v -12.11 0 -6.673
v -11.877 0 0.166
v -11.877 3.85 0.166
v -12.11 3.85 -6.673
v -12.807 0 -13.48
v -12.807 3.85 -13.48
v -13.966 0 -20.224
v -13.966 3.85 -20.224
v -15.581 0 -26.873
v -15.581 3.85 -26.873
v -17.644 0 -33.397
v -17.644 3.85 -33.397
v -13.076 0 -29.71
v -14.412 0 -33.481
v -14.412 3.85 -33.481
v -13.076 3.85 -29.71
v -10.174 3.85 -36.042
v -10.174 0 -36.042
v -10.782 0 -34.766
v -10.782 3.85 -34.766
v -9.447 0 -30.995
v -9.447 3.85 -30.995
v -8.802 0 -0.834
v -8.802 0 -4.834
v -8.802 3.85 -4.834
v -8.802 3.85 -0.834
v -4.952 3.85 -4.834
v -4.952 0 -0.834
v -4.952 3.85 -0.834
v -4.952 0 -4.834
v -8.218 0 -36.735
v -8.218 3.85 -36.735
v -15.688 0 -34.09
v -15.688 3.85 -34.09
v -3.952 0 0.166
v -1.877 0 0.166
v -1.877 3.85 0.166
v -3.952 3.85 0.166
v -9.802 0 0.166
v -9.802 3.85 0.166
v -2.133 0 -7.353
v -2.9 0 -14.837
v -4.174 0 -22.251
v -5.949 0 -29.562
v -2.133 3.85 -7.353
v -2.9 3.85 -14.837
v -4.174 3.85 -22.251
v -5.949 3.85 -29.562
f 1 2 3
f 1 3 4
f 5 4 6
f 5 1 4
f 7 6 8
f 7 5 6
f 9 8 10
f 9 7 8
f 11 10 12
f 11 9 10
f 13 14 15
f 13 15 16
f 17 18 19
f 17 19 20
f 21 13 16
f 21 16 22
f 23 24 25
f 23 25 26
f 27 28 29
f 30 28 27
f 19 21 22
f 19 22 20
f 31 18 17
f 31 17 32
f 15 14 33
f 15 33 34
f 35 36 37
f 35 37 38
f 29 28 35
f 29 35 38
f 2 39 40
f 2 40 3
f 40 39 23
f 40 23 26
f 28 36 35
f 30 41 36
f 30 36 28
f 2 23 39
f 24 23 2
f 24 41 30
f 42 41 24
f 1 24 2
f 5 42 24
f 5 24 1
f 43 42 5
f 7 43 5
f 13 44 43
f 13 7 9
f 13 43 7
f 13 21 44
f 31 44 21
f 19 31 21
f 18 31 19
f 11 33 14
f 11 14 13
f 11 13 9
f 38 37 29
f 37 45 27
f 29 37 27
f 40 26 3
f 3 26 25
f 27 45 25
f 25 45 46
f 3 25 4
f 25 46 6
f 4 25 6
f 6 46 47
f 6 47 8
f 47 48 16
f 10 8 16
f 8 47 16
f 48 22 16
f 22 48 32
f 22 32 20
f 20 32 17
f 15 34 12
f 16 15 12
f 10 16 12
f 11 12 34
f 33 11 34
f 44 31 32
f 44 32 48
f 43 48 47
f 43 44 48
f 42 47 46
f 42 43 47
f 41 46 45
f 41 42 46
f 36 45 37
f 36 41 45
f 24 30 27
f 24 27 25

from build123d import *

# Parameters (mm, degrees)
BOSS_EXTRUDE1_DEPTH = 3.85
CHAMFER1_SIZE       = 1


with BuildPart() as part:
    # Sketch1 → Boss-Extrude1 (new body)
    with BuildSketch(Plane(origin=(0, 0, 0), x_dir=(1, 0, 0), z_dir=(0, 1, 0))):
        with BuildLine():
            Line((-17.644097819, 33.396892859), (-14.745475234, 34.423348951))
            Line((-14.745475234, 34.423348951), (-13.076440938, 29.710141496))
            Line((-13.076440938, 29.710141496), (-9.447271197, 30.995297904))
            Line((-9.447271197, 30.995297904), (-11.116305493, 35.708505359))
            Line((-11.116305493, 35.708505359), (-8.217682908, 36.734961451))
            ThreePointArc((-8.217682908, 36.734961451), (-3.473682306, 18.55498598), (-1.876973594, -0.165793148))
            Line((-1.876973594, -0.165793148), (-4.951973594, -0.165793148))
            Line((-4.951973594, -0.165793148), (-4.951973594, 4.834206852))
            Line((-4.951973594, 4.834206852), (-8.801973594, 4.834206852))
            Line((-8.801973594, 4.834206852), (-8.801973594, -0.165793148))
            Line((-8.801973594, -0.165793148), (-11.876973594, -0.165793148))
            ThreePointArc((-11.876973594, -0.165793148), (-13.329242897, 16.861490941), (-17.644097819, 33.396892859))
        make_face()
    extrude(amount=BOSS_EXTRUDE1_DEPTH)

    # Chamfer1
    chamfer1_edges = [part.edges().sort_by_distance(p)[0] for p in [
        (-14.745475234, 1.925, -34.423348951),
        (-11.116305493, 1.925, -35.708505359),
        (-4.951973594, 1.925, 0.165793148),
        (-8.801973594, 1.925, 0.165793148),
    ]]
    chamfer(chamfer1_edges, length=CHAMFER1_SIZE)


solid = part.part
